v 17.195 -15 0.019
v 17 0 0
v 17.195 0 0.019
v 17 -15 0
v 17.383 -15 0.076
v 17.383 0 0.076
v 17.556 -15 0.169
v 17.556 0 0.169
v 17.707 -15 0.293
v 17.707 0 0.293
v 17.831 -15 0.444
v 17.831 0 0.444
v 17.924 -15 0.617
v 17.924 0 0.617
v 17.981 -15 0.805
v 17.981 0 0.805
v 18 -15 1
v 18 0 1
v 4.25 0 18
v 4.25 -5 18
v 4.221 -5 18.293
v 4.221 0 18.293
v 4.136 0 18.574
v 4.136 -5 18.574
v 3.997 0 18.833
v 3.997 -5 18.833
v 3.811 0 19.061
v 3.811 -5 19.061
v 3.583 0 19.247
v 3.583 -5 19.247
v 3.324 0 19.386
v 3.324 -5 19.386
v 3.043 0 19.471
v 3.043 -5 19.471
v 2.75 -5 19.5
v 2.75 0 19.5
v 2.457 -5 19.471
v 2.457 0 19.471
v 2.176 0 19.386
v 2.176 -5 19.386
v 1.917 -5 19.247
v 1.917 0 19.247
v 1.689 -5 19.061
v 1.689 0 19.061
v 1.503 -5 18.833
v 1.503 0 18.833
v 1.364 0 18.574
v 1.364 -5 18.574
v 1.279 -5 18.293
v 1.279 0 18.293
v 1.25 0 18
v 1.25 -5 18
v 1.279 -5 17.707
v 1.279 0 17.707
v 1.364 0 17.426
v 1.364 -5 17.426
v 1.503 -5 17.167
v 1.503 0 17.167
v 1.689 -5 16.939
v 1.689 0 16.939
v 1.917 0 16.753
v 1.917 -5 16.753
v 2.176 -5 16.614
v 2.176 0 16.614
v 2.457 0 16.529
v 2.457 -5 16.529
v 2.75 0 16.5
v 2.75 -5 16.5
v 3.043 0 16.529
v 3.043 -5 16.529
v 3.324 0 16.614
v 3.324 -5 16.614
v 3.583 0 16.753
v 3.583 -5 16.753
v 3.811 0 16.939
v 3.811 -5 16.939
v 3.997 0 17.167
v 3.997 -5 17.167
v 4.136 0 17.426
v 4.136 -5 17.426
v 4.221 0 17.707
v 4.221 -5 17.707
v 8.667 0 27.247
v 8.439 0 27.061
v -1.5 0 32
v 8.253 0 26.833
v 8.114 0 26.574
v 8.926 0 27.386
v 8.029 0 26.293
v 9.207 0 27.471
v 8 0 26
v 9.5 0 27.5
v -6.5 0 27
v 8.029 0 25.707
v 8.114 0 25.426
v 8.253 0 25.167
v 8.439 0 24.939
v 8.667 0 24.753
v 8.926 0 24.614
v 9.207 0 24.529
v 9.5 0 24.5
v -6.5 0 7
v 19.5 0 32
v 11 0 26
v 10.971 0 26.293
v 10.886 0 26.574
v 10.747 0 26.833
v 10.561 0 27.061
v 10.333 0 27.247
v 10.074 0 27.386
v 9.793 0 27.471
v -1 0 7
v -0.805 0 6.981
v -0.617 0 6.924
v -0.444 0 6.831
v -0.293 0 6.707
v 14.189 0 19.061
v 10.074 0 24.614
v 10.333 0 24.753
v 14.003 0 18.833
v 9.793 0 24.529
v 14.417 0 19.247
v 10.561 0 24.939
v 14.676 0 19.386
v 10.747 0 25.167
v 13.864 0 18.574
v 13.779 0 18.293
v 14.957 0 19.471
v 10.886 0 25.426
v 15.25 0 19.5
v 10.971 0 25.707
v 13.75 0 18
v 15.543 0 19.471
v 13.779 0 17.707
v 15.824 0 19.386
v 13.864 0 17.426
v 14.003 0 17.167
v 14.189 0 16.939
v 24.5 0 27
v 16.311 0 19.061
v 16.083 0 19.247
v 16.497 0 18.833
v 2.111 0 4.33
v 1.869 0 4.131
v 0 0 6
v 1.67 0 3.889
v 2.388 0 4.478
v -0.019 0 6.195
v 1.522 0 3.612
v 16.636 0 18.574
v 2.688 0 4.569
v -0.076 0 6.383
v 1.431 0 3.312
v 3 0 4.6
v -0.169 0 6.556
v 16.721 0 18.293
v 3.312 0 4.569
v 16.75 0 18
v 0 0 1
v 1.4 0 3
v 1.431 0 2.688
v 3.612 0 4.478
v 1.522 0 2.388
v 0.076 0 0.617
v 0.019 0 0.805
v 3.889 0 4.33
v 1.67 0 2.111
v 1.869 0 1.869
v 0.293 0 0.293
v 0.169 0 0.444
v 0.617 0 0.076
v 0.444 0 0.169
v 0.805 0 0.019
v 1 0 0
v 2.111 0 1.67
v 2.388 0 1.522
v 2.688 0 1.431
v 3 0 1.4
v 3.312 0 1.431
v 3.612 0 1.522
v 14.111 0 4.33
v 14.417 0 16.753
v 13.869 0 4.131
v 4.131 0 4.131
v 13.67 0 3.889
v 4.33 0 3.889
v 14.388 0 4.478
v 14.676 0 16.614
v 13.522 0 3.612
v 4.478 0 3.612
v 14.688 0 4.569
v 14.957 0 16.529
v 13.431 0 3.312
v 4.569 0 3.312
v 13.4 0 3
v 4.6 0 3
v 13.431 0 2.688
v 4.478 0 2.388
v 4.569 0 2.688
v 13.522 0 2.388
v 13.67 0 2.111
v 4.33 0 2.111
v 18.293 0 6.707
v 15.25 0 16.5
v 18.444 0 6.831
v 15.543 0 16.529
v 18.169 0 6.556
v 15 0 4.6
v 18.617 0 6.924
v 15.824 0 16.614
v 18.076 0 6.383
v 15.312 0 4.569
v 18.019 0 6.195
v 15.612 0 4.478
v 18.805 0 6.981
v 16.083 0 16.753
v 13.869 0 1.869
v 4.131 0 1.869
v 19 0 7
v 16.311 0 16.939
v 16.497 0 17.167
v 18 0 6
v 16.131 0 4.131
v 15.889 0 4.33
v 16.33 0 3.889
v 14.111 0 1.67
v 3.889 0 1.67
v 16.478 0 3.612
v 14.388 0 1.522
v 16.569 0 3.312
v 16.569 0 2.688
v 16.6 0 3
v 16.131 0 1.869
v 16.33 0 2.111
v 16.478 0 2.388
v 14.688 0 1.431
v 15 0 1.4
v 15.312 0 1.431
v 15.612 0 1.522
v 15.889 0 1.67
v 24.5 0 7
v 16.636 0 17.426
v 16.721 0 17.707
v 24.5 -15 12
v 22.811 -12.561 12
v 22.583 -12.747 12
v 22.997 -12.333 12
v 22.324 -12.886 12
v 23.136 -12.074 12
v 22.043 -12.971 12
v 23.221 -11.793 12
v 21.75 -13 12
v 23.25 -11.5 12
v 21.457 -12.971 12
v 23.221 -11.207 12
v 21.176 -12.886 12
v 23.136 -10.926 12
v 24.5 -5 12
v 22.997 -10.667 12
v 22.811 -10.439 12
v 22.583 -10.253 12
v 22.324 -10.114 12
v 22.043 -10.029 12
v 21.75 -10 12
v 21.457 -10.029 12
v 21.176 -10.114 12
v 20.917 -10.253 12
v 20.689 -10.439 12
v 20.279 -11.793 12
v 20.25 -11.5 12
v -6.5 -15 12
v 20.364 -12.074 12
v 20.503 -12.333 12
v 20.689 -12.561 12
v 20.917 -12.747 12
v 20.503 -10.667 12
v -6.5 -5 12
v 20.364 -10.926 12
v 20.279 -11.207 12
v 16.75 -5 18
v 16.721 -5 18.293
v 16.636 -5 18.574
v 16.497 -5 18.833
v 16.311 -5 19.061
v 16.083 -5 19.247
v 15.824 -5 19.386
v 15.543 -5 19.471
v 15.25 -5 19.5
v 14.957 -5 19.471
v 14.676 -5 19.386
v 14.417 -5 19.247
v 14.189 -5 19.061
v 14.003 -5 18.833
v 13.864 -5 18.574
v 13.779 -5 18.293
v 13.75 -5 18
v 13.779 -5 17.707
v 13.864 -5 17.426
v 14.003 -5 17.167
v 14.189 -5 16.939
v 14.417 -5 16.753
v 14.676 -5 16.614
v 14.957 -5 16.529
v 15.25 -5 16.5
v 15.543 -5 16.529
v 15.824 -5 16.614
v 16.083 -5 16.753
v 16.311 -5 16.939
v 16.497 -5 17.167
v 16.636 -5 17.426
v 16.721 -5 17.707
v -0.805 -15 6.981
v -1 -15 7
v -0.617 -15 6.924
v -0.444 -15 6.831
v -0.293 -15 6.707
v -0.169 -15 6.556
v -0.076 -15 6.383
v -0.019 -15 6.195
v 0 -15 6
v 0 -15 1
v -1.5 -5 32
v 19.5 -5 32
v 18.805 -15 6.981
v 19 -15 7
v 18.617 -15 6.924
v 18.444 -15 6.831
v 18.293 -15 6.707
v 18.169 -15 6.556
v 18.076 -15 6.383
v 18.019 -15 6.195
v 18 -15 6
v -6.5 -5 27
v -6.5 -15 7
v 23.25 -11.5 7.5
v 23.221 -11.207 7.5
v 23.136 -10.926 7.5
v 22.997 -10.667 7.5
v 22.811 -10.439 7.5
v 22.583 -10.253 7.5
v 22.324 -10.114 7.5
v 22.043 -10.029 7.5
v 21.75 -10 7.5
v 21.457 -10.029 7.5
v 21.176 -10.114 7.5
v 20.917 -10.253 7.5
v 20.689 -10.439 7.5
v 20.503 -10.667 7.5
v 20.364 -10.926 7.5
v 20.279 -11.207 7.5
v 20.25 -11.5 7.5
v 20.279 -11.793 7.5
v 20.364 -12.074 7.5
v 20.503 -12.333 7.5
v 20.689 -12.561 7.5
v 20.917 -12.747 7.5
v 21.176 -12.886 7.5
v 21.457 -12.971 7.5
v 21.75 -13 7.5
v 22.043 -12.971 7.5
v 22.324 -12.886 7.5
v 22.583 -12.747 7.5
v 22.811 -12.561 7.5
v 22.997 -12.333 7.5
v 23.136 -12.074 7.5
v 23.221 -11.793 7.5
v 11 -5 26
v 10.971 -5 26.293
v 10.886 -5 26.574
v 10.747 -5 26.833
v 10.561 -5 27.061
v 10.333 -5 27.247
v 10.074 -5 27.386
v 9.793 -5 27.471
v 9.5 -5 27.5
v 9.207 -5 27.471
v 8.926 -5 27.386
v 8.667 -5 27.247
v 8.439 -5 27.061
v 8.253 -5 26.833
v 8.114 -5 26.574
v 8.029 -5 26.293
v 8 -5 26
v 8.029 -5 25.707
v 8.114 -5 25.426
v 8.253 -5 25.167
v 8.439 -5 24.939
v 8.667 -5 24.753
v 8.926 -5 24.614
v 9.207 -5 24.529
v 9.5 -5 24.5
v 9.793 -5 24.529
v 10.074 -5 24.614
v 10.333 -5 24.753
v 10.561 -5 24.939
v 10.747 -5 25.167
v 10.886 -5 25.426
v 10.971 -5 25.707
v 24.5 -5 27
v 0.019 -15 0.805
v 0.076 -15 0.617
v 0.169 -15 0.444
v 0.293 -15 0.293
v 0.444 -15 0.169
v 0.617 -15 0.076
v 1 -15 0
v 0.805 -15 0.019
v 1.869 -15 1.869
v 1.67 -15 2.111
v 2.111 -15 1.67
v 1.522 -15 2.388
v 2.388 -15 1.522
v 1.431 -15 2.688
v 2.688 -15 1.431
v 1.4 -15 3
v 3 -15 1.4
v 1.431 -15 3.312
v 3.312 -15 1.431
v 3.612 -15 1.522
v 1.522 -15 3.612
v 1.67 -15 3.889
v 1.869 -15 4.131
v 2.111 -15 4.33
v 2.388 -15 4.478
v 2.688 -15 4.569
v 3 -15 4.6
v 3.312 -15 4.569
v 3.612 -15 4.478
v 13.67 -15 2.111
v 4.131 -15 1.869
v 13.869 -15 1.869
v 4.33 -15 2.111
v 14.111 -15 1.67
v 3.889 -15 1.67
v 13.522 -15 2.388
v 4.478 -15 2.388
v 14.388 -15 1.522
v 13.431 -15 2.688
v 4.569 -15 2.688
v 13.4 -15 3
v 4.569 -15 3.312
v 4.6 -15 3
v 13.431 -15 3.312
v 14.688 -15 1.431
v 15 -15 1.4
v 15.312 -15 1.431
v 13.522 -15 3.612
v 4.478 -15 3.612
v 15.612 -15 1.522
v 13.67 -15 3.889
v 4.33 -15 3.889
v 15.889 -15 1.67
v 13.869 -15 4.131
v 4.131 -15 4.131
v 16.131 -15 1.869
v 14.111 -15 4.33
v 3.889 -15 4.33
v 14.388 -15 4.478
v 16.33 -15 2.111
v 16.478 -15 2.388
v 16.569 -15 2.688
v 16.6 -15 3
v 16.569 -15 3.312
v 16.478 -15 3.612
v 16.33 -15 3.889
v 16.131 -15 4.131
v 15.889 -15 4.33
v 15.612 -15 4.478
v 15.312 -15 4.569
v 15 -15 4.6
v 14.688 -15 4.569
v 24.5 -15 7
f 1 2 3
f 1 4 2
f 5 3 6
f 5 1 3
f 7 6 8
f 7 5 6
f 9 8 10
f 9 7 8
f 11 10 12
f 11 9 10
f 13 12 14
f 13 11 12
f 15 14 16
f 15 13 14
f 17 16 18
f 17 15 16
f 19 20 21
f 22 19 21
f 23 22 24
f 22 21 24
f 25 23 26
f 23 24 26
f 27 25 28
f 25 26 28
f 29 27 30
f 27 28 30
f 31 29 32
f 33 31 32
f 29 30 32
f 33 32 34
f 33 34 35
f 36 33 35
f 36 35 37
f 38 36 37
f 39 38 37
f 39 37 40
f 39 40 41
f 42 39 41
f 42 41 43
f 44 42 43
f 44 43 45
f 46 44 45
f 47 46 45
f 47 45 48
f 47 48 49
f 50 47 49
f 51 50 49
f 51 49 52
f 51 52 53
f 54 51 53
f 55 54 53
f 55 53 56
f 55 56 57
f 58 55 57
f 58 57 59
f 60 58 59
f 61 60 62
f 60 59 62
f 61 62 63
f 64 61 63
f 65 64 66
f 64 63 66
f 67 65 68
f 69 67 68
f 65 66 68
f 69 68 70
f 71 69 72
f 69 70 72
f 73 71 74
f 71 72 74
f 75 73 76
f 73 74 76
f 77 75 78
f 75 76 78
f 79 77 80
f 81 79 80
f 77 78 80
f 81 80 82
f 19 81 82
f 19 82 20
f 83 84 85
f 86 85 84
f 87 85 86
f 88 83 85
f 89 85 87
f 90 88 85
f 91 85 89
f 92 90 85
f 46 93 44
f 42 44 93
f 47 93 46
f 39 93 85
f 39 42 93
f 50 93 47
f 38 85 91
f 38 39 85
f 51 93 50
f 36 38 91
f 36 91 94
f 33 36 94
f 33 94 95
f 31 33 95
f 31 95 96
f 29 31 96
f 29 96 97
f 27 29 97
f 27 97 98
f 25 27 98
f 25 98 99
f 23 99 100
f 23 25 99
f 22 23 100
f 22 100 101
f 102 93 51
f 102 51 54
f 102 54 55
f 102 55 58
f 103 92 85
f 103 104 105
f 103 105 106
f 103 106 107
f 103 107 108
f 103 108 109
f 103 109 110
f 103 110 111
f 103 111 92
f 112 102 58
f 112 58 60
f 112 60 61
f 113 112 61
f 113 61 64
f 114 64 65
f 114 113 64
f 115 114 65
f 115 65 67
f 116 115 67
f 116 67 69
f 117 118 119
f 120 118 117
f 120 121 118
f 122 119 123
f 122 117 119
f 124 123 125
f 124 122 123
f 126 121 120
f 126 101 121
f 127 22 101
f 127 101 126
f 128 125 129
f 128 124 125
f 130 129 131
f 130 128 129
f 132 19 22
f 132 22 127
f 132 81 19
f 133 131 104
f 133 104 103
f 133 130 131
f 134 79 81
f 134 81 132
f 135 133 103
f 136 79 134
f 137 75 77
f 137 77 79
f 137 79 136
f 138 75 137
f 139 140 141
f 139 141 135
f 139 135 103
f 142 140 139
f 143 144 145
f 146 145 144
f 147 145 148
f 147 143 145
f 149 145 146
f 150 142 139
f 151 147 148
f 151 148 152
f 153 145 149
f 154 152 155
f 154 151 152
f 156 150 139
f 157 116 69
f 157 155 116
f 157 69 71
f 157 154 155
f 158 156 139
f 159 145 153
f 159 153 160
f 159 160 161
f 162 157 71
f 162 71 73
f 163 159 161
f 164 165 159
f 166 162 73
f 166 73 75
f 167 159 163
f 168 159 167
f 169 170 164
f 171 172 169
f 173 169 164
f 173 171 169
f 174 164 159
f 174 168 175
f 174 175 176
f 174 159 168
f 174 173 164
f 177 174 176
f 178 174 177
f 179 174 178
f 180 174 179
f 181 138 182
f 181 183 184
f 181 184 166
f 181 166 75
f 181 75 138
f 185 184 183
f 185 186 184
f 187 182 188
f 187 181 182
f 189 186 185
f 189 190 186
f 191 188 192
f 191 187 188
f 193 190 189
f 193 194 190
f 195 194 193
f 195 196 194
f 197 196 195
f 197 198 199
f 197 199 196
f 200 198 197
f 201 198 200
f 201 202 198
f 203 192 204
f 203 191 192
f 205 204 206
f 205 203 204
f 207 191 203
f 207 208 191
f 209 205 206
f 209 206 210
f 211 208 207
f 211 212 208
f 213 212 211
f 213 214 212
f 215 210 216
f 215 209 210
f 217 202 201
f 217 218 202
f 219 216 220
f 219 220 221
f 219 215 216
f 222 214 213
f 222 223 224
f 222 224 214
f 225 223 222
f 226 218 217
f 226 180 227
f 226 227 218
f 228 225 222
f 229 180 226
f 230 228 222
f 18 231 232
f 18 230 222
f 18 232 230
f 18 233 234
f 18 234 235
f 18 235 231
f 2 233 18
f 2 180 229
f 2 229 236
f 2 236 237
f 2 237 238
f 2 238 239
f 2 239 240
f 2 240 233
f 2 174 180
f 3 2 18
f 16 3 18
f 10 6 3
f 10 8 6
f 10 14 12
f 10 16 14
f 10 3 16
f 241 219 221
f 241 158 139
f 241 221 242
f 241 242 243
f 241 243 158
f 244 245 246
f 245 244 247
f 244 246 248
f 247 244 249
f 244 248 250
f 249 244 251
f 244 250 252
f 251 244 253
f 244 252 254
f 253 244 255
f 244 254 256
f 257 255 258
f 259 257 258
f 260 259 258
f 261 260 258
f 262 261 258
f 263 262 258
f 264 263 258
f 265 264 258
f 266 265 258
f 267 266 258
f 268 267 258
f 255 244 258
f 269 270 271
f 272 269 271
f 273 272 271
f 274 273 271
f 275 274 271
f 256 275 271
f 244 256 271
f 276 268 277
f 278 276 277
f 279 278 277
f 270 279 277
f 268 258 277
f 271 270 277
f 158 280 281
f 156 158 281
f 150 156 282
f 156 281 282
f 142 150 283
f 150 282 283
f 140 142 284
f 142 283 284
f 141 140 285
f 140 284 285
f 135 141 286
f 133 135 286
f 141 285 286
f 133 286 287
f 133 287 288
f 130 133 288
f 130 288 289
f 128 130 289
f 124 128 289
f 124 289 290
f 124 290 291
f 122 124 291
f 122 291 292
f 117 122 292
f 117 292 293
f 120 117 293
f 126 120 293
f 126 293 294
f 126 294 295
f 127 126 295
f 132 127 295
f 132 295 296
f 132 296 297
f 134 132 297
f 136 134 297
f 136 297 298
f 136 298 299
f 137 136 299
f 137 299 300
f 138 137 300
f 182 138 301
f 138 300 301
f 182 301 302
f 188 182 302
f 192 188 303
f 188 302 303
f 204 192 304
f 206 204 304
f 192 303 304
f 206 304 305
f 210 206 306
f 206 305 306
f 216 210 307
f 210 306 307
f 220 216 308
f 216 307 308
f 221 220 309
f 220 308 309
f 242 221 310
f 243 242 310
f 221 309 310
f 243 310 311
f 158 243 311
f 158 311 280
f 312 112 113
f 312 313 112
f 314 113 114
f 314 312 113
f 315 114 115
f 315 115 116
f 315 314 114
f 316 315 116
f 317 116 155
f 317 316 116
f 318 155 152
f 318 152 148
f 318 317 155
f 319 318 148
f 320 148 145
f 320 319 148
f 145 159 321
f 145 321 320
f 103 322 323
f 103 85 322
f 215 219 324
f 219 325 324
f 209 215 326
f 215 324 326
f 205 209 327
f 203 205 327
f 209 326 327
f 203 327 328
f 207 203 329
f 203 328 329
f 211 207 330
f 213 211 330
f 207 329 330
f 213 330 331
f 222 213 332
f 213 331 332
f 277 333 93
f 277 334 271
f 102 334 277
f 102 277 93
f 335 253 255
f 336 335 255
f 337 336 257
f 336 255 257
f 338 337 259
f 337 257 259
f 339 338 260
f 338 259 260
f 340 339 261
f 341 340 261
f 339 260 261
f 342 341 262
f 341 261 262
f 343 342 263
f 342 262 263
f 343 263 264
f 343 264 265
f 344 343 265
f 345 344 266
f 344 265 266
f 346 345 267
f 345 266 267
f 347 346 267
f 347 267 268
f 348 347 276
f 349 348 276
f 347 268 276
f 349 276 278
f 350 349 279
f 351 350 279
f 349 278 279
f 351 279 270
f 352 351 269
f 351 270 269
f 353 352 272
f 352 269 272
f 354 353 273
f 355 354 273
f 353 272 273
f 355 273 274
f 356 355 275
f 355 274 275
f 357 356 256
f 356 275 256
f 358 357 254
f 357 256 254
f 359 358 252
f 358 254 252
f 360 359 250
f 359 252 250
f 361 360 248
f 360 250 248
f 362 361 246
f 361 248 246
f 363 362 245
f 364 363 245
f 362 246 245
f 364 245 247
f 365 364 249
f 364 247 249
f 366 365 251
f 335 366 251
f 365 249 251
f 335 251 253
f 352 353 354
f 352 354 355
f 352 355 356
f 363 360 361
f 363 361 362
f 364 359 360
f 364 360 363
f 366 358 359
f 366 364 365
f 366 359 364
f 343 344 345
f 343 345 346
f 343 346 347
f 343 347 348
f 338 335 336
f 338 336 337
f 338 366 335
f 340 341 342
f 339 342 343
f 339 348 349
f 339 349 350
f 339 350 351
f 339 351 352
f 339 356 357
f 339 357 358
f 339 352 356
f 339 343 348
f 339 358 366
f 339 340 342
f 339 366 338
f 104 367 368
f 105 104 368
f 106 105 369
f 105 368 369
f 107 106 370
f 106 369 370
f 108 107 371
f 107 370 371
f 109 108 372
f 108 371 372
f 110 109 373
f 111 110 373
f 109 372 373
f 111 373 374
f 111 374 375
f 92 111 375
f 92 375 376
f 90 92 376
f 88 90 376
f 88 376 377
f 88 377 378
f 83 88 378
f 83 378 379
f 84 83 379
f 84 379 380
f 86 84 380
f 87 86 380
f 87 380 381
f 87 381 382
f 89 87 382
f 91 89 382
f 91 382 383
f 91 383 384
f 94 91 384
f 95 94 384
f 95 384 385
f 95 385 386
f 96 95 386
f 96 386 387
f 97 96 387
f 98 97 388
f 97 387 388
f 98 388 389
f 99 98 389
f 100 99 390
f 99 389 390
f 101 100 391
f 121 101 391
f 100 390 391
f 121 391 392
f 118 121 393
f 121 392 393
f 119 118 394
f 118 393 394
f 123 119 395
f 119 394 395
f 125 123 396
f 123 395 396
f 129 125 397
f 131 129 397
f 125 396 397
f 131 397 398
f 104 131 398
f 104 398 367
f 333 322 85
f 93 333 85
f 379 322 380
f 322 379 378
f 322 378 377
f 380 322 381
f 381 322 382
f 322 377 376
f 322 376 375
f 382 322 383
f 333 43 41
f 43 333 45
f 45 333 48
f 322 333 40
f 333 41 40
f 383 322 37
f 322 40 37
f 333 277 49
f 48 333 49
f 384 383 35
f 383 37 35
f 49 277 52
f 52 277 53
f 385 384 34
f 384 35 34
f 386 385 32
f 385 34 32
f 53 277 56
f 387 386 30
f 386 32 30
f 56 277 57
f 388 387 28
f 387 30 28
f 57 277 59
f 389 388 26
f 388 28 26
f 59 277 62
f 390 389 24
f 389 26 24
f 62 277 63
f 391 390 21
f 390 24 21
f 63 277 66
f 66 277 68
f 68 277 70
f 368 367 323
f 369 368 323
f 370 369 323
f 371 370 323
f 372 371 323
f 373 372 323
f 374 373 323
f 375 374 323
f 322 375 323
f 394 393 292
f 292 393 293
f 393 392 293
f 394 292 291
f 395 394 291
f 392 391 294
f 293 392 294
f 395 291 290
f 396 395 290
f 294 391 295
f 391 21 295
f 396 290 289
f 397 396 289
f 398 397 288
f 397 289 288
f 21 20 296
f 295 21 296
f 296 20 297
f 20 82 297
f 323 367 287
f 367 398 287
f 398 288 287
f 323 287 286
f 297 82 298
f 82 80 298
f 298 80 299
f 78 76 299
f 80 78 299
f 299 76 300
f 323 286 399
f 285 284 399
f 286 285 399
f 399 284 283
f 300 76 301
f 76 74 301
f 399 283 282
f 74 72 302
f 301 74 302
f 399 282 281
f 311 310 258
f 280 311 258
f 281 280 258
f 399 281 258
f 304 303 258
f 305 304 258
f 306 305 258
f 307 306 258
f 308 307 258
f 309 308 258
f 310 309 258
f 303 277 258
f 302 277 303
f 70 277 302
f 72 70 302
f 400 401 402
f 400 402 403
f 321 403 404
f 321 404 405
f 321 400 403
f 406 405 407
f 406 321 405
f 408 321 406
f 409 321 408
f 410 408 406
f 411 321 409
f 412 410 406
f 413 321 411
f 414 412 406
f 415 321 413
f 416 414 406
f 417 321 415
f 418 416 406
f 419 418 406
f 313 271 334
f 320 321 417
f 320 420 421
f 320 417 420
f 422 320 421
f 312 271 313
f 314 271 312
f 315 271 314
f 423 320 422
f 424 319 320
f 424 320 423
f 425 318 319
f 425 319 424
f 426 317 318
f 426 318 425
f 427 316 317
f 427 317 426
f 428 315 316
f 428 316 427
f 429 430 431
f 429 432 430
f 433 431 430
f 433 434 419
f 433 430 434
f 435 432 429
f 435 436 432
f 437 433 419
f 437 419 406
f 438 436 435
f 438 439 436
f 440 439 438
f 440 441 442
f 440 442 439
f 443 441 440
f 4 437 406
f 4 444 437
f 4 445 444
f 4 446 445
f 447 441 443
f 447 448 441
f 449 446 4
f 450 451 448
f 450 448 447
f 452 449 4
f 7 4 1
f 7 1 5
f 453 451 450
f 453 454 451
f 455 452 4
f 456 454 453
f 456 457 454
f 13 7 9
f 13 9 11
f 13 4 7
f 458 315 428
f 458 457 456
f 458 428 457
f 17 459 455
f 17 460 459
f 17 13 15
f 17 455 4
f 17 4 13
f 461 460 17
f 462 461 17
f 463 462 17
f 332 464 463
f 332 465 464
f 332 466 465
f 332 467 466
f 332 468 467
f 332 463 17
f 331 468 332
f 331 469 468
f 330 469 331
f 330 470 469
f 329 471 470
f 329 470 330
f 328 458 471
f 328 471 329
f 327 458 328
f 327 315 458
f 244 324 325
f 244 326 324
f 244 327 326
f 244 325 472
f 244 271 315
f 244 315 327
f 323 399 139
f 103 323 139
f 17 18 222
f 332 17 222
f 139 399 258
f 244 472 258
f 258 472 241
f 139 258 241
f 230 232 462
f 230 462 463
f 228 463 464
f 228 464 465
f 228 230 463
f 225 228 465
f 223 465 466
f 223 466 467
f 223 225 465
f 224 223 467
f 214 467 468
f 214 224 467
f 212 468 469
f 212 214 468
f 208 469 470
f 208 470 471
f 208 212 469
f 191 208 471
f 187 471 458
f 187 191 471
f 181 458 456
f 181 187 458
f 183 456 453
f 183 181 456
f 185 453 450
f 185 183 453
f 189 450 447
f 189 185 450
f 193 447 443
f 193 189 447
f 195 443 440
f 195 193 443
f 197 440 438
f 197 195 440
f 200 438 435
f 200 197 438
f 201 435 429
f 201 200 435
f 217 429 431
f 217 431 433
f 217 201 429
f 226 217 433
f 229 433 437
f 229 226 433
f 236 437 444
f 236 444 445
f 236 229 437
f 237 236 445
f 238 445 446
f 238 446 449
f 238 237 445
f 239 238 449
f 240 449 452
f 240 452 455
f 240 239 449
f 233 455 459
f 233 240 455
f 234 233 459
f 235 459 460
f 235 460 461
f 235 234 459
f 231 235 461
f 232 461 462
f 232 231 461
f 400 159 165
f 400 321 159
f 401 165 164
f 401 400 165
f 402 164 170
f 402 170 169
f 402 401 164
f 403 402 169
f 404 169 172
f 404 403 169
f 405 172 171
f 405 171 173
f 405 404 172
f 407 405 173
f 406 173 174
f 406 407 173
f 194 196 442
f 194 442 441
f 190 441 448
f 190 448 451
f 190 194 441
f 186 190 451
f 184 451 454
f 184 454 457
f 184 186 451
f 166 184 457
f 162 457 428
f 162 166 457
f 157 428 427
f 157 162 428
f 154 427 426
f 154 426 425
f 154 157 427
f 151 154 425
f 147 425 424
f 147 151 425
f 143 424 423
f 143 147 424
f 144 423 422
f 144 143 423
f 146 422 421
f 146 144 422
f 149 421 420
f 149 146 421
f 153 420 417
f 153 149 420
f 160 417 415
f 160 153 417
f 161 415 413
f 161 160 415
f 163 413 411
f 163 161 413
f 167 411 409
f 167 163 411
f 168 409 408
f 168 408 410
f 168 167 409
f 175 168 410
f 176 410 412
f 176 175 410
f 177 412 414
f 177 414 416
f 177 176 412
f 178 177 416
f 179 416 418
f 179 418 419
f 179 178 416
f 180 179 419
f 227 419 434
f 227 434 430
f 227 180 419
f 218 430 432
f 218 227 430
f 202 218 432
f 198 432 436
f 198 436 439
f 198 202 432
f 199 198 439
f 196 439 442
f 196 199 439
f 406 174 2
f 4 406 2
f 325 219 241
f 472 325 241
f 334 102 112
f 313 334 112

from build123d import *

# Parameters (mm, degrees)
F0_W      = 18
F0_H      = 7
F0_R      = 1.6
F1_DEPTH  = 15
F2_W      = 31
F2_H      = 5
F3_DEPTH  = 20
F4_R      = 1.5
F5_DEPTH  = 25
F6_R      = 1.5
F7_DEPTH  = 4.5
F8_R      = 1
F9_SIZE   = 5
F10_R     = 1.5
F11_DEPTH = 25


with BuildPart() as f1:
    # F0 (on Front) → F1 (new body)
    with BuildSketch(Plane.XZ):
        with Locations((9, 3.5)):
            Rectangle(F0_W, F0_H)
        with Locations((3, 3)):
            Circle(F0_R, mode=Mode.SUBTRACT)
        with Locations((15, 3)):
            Circle(F0_R, mode=Mode.SUBTRACT)
        Polygon((-6.5, 7), (0, 7), (18, 7), (24.5, 7), (24.5, 12), (0, 12), (-6.5, 12), align=None)
    extrude(amount=F1_DEPTH)

    # F2 (on face) → F3 (join)
    with BuildSketch(Plane.XY.offset(12)):
        with Locations((9, -2.5)):
            Rectangle(F2_W, F2_H)
    extrude(amount=F3_DEPTH)

    # F4 (on face) → F5 (cut)
    with BuildSketch(Plane.XZ.offset(5)):
        with Locations((2.75, 18)):
            Circle(F4_R)
        with Locations((15.25, 18)):
            Circle(F4_R)
    extrude(amount=-F5_DEPTH, mode=Mode.SUBTRACT)

    # F6 (on face) → F7 (cut)
    with BuildSketch(Plane.XY.offset(12)):
        with Locations((21.75, -11.5)):
            Circle(F6_R)
    extrude(amount=-F7_DEPTH, mode=Mode.SUBTRACT)

    # F8
    f8_edges = [f1.edges().sort_by_distance(p)[0] for p in [
        (0, -7.5, 0),
        (18, -7.5, 0),
        (0, -7.5, 7),
        (18, -7.5, 7),
    ]]
    fillet(f8_edges, radius=F8_R)

    # F9
    f9_edges = [f1.edges().sort_by_distance(p)[0] for p in [
        (24.5, -2.5, 32),
        (-6.5, -2.5, 32),
    ]]
    chamfer(f9_edges, length=F9_SIZE)

    # F10 (on face) → F11 (cut)
    with BuildSketch(Plane.XZ.offset(5)):
        with Locations((9.5, 26)):
            Circle(F10_R)
    extrude(amount=-F11_DEPTH, mode=Mode.SUBTRACT)


solid = f1.part
